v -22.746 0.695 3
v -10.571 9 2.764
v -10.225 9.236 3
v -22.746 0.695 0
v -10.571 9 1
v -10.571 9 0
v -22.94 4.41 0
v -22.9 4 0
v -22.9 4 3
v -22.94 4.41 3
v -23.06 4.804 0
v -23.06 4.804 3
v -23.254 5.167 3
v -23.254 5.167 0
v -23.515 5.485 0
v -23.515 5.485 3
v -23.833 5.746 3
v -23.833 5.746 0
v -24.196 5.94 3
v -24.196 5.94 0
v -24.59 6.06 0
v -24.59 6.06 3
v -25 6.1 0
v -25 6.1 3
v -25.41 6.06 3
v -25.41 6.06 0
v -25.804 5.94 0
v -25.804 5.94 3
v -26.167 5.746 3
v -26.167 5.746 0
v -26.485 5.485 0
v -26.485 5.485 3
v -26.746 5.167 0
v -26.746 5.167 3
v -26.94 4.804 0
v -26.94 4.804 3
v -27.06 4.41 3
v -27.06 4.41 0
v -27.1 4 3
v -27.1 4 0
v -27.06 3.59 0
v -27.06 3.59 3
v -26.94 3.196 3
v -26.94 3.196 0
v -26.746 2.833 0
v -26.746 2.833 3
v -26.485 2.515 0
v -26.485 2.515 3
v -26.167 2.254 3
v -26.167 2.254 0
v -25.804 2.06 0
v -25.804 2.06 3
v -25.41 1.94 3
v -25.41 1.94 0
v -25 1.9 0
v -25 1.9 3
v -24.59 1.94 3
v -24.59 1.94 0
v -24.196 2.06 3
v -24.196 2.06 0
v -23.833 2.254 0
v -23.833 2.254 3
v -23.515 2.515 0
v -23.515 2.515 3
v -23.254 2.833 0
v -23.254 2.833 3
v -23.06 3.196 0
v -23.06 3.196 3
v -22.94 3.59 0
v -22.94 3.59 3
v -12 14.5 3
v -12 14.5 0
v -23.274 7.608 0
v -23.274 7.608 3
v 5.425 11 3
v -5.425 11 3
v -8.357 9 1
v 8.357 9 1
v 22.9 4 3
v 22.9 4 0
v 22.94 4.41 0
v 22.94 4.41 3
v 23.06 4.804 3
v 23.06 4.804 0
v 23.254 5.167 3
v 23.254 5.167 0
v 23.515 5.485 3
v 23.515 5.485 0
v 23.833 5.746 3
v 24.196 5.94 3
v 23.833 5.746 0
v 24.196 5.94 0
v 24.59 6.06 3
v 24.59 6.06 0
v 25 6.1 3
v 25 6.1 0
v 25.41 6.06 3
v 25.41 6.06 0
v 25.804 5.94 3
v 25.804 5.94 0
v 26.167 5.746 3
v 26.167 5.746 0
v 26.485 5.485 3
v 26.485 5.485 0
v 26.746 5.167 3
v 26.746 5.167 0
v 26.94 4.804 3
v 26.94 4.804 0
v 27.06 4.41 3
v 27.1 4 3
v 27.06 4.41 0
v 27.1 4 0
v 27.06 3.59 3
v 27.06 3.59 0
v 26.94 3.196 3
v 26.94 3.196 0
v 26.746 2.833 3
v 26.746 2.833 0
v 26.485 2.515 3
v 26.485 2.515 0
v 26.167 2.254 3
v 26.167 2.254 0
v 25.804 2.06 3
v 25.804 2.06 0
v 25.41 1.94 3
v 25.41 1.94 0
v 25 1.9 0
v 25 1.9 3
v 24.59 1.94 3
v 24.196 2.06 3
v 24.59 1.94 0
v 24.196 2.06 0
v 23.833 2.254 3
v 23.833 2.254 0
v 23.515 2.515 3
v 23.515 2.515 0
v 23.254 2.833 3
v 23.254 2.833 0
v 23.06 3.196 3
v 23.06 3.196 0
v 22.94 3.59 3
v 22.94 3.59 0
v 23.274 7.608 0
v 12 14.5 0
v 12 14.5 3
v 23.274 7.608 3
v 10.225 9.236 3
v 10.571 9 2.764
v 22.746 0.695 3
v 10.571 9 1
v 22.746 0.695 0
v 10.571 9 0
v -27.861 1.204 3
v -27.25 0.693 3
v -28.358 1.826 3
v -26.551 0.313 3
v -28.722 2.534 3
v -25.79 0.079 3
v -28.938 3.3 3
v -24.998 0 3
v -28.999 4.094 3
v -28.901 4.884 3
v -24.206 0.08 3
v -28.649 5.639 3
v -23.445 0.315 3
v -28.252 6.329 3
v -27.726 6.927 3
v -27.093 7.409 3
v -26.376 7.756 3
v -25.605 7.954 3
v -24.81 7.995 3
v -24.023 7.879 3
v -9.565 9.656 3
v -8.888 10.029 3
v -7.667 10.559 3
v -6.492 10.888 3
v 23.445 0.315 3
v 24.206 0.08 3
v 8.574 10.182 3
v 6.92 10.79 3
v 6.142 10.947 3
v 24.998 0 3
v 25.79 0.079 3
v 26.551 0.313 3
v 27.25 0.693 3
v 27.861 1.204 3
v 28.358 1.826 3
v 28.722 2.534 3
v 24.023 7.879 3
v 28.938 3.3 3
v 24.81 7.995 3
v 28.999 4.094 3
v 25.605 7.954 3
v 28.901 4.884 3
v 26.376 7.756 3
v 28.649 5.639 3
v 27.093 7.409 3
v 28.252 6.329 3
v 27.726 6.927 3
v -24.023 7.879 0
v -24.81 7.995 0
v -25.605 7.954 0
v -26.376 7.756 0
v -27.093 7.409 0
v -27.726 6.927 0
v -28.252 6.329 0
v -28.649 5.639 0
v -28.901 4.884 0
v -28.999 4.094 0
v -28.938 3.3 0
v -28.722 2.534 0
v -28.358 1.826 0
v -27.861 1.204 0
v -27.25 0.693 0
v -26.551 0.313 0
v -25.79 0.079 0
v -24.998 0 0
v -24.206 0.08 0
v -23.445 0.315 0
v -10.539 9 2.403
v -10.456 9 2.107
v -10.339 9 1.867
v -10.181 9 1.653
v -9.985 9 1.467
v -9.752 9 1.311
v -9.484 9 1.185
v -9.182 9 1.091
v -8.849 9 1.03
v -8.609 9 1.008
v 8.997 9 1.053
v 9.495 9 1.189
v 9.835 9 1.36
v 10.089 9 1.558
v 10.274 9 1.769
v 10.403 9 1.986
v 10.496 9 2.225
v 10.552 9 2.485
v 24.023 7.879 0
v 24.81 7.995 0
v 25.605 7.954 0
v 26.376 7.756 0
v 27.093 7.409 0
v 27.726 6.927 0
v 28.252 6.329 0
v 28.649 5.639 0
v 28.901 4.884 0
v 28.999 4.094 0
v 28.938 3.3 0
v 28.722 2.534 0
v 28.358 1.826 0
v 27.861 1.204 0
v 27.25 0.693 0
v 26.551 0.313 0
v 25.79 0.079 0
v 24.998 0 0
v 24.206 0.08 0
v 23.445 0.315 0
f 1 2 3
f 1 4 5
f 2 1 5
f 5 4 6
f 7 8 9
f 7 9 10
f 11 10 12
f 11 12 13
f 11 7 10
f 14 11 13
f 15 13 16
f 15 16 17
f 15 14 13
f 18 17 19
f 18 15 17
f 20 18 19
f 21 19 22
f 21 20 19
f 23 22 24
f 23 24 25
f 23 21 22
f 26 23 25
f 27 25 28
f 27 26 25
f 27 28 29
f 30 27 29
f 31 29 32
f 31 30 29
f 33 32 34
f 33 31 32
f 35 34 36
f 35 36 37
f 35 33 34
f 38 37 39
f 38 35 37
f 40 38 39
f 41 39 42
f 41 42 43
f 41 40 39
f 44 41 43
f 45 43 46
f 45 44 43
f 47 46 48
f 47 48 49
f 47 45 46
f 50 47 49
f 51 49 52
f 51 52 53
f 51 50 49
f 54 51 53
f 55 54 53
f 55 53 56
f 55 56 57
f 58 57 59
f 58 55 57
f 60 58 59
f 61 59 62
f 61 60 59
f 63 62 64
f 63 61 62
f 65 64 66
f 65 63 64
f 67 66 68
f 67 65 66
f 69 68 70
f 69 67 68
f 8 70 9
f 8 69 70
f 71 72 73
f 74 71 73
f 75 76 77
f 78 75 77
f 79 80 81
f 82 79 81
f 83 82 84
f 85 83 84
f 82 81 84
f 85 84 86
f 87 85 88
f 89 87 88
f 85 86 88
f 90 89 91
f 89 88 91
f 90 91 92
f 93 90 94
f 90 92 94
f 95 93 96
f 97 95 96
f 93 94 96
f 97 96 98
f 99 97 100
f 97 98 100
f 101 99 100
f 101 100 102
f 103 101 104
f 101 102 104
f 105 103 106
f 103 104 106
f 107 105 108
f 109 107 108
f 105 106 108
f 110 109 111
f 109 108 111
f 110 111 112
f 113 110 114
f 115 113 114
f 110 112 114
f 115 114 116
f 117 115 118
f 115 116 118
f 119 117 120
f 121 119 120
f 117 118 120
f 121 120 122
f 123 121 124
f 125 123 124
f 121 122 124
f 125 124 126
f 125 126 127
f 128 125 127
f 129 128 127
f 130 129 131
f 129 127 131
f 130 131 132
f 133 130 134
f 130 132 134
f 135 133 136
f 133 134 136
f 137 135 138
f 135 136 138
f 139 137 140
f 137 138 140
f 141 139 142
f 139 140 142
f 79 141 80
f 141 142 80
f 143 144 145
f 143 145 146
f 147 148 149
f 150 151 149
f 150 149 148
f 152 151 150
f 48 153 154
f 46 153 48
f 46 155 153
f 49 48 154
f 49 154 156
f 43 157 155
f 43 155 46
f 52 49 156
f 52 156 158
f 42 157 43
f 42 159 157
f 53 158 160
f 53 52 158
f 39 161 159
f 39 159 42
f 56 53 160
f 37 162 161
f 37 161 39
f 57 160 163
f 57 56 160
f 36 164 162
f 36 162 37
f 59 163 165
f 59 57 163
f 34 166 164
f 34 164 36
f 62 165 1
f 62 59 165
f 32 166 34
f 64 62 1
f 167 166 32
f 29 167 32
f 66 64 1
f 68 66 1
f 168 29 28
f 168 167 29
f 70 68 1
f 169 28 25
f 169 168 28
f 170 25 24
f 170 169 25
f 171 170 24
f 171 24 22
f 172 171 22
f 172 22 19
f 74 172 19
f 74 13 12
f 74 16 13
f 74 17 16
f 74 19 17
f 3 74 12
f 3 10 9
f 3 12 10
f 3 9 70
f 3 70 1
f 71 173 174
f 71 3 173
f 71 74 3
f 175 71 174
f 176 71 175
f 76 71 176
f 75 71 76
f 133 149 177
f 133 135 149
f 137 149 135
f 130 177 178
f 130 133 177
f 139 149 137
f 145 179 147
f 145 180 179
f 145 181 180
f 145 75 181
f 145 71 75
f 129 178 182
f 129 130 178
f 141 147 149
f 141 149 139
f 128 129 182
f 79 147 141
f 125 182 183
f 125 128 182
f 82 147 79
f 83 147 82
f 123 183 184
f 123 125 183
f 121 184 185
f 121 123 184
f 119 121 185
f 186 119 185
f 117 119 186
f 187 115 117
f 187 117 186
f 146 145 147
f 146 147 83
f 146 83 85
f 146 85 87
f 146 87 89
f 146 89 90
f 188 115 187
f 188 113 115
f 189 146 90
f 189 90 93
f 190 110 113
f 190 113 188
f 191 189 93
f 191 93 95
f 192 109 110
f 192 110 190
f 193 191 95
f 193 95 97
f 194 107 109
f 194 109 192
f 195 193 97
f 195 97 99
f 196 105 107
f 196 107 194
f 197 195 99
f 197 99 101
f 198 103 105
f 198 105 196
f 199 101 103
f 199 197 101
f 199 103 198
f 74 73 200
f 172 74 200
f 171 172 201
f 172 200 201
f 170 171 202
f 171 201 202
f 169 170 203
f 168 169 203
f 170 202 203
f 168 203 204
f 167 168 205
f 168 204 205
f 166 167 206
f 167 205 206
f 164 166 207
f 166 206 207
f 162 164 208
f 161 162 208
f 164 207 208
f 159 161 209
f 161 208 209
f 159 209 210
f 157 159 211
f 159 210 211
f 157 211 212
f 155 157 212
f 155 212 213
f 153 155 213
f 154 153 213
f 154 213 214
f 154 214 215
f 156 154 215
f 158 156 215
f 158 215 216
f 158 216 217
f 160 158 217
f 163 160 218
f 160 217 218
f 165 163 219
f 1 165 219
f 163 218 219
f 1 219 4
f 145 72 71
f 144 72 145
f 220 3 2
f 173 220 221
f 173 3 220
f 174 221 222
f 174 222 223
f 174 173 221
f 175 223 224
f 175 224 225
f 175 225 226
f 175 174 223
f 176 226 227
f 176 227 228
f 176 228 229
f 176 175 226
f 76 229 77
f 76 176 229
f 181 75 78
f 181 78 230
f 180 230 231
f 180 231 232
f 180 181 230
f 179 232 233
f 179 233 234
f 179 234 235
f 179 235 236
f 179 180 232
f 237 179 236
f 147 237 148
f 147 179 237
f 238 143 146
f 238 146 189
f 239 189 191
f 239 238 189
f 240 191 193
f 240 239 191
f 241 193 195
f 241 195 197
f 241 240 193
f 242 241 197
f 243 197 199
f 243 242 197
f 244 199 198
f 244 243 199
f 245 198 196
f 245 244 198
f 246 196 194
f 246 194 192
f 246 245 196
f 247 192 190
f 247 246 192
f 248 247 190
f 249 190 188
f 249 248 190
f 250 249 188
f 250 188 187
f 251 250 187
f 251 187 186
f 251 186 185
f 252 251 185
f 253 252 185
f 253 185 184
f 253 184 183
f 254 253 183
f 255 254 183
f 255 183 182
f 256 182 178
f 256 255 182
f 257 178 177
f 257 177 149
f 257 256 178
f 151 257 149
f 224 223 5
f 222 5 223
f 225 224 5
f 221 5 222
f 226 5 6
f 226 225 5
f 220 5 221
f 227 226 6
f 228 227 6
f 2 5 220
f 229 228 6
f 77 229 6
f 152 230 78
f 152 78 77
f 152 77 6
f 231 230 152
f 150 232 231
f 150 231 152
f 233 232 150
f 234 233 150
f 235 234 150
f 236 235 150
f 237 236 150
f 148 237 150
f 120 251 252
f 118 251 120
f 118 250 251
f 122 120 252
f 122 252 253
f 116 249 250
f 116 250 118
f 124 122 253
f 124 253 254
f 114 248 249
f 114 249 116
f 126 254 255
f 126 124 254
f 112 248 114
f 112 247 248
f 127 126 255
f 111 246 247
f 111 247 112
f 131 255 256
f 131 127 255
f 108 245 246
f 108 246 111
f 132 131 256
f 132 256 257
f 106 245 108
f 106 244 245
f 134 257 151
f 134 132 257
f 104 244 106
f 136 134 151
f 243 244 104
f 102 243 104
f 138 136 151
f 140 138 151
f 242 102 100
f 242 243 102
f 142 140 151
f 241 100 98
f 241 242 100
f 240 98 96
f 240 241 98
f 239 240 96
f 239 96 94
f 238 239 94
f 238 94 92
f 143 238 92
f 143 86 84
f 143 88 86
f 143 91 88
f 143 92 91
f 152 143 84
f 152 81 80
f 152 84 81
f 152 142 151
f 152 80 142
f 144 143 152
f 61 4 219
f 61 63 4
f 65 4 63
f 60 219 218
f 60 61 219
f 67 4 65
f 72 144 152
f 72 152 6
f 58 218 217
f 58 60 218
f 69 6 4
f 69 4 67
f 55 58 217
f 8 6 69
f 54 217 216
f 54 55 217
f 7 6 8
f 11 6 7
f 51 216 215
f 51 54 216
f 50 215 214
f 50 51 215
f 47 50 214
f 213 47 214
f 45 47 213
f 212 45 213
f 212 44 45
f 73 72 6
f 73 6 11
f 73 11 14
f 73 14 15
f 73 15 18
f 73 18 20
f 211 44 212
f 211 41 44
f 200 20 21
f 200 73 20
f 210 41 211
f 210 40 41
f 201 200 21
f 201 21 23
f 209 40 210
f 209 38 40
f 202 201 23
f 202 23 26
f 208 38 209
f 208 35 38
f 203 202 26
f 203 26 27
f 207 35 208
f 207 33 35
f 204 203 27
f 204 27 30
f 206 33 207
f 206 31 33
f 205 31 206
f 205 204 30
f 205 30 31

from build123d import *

# Parameters (mm, degrees)
F0_R         = 2.1
F1_DEPTH     = 3
F3_SIZE2     = 2
F3_SIZE      = 2
F4_T4_DEPTH  = 11.7592419794
F4_T10_DEPTH = 11.7592419794


# Not quite as in the source:
# - a fillet or chamfer that OpenCascade refuses, or shapes differently, is made with other operations: its cross-section is extruded or revolved along the edge and cut away or added


with BuildPart() as f1:
    # F0 (on Top) → F1 (new body)
    with BuildSketch(Plane.XY):
        with BuildLine():
            Line((0, 9), (0, 14.5))
            Line((0, 14.5), (-12, 14.5))
            Line((-12, 14.5), (-23.2738011309, 7.6083566155))
            ThreePointArc((-23.2738011309, 7.6083566155), (-28.988394733, 3.6955210129), (-22.746064478, 0.6954917669))
            Line((-22.746064478, 0.6954917669), (-10.5707757175, 9))
            Line((-10.5707757175, 9), (0, 9))
        make_face()
        with Locations((-25, 4)):
            Circle(F0_R, mode=Mode.SUBTRACT)
    extrude(amount=F1_DEPTH)

    # F2: F1 across plane


with BuildPart() as f1_1:
    add(f1.part)
    add(f1.part.mirror(Plane.YZ))

    # F3
    f3_edges = [f1_1.edges().sort_by_distance(p)[0] for p in [
        (0, 9, 3),
    ]]
    chamfer(f3_edges, length=F3_SIZE, length2=F3_SIZE2)

    # F4: fillet of radius 3 on 2 edges, made by hand


with BuildPart() as f4_tool2:
    # F4_s3 → F4_t4 (new body)
    with BuildSketch(Plane(origin=(-3.7553101229, 2.5614180039, 2.5614180039), x_dir=(0.5634838805, 0.8261270583, 0), z_dir=(0.7197293509, -0.4909122434, -0.4909122434))):
        with BuildLine():
            ThreePointArc((12.1440853808, 1.7707824696), (13.0615715756, 2.8377506524), (13.3916052457, 4.2056979457))
            Line((13.3916052457, 4.2056979457), (13.3916052457, 2.6686591321))
            Line((13.3916052457, 2.6686591321), (12.1440853808, 1.7707824696))
        make_face()
    extrude(amount=F4_T4_DEPTH)

    split(bisect_by=Plane.XY.offset(3), keep=Keep.BOTTOM)

    split(bisect_by=Plane.XZ.offset(-9), keep=Keep.BOTTOM)


with BuildPart() as f1_2:
    add(f1_1.part)

    # F4_t1: union F4_tool2
    add(f4_tool2.part)


with BuildPart() as f4_tool8:
    # F4_s9 → F4_t10 (new body)
    with BuildSketch(Plane(origin=(3.7553101229, 2.5614180039, 2.5614180039), x_dir=(0.5634838805, -0.8261270583, 0), z_dir=(-0.7197293509, -0.4909122434, -0.4909122434))):
        with BuildLine():
            ThreePointArc((-13.3916052457, 4.2056979457), (-13.0615715756, 2.8377506524), (-12.1440853808, 1.7707824696))
            Line((-12.1440853808, 1.7707824696), (-13.3916052457, 2.6686591321))
            Line((-13.3916052457, 2.6686591321), (-13.3916052457, 4.2056979457))
        make_face()
    extrude(amount=F4_T10_DEPTH)

    split(bisect_by=Plane.XY.offset(3), keep=Keep.BOTTOM)

    split(bisect_by=Plane.XZ.offset(-9), keep=Keep.BOTTOM)


with BuildPart() as f1_3:
    add(f1_2.part)

    # F4_t7: union F4_tool8
    add(f4_tool8.part)


solid = f1_3.part
